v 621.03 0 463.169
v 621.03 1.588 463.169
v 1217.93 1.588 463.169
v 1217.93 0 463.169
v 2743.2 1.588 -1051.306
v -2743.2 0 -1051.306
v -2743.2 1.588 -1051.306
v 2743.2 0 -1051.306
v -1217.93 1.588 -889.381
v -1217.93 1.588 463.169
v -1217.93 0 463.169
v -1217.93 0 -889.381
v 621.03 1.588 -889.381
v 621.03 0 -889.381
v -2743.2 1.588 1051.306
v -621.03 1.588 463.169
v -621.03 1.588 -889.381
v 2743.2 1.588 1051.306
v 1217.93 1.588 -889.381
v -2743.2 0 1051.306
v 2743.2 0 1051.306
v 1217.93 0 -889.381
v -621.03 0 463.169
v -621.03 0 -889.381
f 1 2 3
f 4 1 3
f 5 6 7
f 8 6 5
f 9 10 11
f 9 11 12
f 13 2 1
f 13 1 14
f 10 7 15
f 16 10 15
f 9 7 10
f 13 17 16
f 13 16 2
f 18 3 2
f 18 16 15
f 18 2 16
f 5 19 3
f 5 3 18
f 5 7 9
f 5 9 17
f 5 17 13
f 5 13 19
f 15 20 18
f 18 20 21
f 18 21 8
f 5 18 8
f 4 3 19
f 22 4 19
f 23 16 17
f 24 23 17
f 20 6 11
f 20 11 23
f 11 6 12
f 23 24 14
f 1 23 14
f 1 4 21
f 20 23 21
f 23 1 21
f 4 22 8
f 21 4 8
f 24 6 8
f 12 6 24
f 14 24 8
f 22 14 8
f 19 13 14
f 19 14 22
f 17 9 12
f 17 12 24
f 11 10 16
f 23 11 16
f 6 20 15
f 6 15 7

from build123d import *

# Parameters (mm, degrees)
SKETCH1_W               = 5486.4
SKETCH1_H               = 2102.612
BOSS_EXTRUDE1_DEPTH     = 1.5875
SKETCH2_W               = 596.9
SKETCH2_H               = 1352.55
CUT_EXTRUDE1_DEPTH      = 1
CUT_EXTRUDE1_DEPTH_BACK = 2.5875


with BuildPart() as part:
    # Sketch1 → Boss-Extrude1 (new body)
    with BuildSketch(Plane(origin=(0, 0, 0), x_dir=(1, 0, 0), z_dir=(0, 1, 0))):
        Rectangle(SKETCH1_W, SKETCH1_H)
    extrude(amount=BOSS_EXTRUDE1_DEPTH)

    # Sketch2 → Cut-Extrude1 (cut, two sides)
    with BuildSketch(Plane(origin=(0, 1.5875, 0), x_dir=(1, 0, 0), z_dir=(0, 1, 0))) as cut_extrude1_sk:
        with Locations((-919.48, 213.106)):
            Rectangle(SKETCH2_W, SKETCH2_H)
        with Locations((919.48, 213.106)):
            Rectangle(SKETCH2_W, SKETCH2_H)
    extrude(amount=CUT_EXTRUDE1_DEPTH, mode=Mode.SUBTRACT)
    extrude(cut_extrude1_sk.sketch, amount=-CUT_EXTRUDE1_DEPTH_BACK, mode=Mode.SUBTRACT)


solid = part.part
